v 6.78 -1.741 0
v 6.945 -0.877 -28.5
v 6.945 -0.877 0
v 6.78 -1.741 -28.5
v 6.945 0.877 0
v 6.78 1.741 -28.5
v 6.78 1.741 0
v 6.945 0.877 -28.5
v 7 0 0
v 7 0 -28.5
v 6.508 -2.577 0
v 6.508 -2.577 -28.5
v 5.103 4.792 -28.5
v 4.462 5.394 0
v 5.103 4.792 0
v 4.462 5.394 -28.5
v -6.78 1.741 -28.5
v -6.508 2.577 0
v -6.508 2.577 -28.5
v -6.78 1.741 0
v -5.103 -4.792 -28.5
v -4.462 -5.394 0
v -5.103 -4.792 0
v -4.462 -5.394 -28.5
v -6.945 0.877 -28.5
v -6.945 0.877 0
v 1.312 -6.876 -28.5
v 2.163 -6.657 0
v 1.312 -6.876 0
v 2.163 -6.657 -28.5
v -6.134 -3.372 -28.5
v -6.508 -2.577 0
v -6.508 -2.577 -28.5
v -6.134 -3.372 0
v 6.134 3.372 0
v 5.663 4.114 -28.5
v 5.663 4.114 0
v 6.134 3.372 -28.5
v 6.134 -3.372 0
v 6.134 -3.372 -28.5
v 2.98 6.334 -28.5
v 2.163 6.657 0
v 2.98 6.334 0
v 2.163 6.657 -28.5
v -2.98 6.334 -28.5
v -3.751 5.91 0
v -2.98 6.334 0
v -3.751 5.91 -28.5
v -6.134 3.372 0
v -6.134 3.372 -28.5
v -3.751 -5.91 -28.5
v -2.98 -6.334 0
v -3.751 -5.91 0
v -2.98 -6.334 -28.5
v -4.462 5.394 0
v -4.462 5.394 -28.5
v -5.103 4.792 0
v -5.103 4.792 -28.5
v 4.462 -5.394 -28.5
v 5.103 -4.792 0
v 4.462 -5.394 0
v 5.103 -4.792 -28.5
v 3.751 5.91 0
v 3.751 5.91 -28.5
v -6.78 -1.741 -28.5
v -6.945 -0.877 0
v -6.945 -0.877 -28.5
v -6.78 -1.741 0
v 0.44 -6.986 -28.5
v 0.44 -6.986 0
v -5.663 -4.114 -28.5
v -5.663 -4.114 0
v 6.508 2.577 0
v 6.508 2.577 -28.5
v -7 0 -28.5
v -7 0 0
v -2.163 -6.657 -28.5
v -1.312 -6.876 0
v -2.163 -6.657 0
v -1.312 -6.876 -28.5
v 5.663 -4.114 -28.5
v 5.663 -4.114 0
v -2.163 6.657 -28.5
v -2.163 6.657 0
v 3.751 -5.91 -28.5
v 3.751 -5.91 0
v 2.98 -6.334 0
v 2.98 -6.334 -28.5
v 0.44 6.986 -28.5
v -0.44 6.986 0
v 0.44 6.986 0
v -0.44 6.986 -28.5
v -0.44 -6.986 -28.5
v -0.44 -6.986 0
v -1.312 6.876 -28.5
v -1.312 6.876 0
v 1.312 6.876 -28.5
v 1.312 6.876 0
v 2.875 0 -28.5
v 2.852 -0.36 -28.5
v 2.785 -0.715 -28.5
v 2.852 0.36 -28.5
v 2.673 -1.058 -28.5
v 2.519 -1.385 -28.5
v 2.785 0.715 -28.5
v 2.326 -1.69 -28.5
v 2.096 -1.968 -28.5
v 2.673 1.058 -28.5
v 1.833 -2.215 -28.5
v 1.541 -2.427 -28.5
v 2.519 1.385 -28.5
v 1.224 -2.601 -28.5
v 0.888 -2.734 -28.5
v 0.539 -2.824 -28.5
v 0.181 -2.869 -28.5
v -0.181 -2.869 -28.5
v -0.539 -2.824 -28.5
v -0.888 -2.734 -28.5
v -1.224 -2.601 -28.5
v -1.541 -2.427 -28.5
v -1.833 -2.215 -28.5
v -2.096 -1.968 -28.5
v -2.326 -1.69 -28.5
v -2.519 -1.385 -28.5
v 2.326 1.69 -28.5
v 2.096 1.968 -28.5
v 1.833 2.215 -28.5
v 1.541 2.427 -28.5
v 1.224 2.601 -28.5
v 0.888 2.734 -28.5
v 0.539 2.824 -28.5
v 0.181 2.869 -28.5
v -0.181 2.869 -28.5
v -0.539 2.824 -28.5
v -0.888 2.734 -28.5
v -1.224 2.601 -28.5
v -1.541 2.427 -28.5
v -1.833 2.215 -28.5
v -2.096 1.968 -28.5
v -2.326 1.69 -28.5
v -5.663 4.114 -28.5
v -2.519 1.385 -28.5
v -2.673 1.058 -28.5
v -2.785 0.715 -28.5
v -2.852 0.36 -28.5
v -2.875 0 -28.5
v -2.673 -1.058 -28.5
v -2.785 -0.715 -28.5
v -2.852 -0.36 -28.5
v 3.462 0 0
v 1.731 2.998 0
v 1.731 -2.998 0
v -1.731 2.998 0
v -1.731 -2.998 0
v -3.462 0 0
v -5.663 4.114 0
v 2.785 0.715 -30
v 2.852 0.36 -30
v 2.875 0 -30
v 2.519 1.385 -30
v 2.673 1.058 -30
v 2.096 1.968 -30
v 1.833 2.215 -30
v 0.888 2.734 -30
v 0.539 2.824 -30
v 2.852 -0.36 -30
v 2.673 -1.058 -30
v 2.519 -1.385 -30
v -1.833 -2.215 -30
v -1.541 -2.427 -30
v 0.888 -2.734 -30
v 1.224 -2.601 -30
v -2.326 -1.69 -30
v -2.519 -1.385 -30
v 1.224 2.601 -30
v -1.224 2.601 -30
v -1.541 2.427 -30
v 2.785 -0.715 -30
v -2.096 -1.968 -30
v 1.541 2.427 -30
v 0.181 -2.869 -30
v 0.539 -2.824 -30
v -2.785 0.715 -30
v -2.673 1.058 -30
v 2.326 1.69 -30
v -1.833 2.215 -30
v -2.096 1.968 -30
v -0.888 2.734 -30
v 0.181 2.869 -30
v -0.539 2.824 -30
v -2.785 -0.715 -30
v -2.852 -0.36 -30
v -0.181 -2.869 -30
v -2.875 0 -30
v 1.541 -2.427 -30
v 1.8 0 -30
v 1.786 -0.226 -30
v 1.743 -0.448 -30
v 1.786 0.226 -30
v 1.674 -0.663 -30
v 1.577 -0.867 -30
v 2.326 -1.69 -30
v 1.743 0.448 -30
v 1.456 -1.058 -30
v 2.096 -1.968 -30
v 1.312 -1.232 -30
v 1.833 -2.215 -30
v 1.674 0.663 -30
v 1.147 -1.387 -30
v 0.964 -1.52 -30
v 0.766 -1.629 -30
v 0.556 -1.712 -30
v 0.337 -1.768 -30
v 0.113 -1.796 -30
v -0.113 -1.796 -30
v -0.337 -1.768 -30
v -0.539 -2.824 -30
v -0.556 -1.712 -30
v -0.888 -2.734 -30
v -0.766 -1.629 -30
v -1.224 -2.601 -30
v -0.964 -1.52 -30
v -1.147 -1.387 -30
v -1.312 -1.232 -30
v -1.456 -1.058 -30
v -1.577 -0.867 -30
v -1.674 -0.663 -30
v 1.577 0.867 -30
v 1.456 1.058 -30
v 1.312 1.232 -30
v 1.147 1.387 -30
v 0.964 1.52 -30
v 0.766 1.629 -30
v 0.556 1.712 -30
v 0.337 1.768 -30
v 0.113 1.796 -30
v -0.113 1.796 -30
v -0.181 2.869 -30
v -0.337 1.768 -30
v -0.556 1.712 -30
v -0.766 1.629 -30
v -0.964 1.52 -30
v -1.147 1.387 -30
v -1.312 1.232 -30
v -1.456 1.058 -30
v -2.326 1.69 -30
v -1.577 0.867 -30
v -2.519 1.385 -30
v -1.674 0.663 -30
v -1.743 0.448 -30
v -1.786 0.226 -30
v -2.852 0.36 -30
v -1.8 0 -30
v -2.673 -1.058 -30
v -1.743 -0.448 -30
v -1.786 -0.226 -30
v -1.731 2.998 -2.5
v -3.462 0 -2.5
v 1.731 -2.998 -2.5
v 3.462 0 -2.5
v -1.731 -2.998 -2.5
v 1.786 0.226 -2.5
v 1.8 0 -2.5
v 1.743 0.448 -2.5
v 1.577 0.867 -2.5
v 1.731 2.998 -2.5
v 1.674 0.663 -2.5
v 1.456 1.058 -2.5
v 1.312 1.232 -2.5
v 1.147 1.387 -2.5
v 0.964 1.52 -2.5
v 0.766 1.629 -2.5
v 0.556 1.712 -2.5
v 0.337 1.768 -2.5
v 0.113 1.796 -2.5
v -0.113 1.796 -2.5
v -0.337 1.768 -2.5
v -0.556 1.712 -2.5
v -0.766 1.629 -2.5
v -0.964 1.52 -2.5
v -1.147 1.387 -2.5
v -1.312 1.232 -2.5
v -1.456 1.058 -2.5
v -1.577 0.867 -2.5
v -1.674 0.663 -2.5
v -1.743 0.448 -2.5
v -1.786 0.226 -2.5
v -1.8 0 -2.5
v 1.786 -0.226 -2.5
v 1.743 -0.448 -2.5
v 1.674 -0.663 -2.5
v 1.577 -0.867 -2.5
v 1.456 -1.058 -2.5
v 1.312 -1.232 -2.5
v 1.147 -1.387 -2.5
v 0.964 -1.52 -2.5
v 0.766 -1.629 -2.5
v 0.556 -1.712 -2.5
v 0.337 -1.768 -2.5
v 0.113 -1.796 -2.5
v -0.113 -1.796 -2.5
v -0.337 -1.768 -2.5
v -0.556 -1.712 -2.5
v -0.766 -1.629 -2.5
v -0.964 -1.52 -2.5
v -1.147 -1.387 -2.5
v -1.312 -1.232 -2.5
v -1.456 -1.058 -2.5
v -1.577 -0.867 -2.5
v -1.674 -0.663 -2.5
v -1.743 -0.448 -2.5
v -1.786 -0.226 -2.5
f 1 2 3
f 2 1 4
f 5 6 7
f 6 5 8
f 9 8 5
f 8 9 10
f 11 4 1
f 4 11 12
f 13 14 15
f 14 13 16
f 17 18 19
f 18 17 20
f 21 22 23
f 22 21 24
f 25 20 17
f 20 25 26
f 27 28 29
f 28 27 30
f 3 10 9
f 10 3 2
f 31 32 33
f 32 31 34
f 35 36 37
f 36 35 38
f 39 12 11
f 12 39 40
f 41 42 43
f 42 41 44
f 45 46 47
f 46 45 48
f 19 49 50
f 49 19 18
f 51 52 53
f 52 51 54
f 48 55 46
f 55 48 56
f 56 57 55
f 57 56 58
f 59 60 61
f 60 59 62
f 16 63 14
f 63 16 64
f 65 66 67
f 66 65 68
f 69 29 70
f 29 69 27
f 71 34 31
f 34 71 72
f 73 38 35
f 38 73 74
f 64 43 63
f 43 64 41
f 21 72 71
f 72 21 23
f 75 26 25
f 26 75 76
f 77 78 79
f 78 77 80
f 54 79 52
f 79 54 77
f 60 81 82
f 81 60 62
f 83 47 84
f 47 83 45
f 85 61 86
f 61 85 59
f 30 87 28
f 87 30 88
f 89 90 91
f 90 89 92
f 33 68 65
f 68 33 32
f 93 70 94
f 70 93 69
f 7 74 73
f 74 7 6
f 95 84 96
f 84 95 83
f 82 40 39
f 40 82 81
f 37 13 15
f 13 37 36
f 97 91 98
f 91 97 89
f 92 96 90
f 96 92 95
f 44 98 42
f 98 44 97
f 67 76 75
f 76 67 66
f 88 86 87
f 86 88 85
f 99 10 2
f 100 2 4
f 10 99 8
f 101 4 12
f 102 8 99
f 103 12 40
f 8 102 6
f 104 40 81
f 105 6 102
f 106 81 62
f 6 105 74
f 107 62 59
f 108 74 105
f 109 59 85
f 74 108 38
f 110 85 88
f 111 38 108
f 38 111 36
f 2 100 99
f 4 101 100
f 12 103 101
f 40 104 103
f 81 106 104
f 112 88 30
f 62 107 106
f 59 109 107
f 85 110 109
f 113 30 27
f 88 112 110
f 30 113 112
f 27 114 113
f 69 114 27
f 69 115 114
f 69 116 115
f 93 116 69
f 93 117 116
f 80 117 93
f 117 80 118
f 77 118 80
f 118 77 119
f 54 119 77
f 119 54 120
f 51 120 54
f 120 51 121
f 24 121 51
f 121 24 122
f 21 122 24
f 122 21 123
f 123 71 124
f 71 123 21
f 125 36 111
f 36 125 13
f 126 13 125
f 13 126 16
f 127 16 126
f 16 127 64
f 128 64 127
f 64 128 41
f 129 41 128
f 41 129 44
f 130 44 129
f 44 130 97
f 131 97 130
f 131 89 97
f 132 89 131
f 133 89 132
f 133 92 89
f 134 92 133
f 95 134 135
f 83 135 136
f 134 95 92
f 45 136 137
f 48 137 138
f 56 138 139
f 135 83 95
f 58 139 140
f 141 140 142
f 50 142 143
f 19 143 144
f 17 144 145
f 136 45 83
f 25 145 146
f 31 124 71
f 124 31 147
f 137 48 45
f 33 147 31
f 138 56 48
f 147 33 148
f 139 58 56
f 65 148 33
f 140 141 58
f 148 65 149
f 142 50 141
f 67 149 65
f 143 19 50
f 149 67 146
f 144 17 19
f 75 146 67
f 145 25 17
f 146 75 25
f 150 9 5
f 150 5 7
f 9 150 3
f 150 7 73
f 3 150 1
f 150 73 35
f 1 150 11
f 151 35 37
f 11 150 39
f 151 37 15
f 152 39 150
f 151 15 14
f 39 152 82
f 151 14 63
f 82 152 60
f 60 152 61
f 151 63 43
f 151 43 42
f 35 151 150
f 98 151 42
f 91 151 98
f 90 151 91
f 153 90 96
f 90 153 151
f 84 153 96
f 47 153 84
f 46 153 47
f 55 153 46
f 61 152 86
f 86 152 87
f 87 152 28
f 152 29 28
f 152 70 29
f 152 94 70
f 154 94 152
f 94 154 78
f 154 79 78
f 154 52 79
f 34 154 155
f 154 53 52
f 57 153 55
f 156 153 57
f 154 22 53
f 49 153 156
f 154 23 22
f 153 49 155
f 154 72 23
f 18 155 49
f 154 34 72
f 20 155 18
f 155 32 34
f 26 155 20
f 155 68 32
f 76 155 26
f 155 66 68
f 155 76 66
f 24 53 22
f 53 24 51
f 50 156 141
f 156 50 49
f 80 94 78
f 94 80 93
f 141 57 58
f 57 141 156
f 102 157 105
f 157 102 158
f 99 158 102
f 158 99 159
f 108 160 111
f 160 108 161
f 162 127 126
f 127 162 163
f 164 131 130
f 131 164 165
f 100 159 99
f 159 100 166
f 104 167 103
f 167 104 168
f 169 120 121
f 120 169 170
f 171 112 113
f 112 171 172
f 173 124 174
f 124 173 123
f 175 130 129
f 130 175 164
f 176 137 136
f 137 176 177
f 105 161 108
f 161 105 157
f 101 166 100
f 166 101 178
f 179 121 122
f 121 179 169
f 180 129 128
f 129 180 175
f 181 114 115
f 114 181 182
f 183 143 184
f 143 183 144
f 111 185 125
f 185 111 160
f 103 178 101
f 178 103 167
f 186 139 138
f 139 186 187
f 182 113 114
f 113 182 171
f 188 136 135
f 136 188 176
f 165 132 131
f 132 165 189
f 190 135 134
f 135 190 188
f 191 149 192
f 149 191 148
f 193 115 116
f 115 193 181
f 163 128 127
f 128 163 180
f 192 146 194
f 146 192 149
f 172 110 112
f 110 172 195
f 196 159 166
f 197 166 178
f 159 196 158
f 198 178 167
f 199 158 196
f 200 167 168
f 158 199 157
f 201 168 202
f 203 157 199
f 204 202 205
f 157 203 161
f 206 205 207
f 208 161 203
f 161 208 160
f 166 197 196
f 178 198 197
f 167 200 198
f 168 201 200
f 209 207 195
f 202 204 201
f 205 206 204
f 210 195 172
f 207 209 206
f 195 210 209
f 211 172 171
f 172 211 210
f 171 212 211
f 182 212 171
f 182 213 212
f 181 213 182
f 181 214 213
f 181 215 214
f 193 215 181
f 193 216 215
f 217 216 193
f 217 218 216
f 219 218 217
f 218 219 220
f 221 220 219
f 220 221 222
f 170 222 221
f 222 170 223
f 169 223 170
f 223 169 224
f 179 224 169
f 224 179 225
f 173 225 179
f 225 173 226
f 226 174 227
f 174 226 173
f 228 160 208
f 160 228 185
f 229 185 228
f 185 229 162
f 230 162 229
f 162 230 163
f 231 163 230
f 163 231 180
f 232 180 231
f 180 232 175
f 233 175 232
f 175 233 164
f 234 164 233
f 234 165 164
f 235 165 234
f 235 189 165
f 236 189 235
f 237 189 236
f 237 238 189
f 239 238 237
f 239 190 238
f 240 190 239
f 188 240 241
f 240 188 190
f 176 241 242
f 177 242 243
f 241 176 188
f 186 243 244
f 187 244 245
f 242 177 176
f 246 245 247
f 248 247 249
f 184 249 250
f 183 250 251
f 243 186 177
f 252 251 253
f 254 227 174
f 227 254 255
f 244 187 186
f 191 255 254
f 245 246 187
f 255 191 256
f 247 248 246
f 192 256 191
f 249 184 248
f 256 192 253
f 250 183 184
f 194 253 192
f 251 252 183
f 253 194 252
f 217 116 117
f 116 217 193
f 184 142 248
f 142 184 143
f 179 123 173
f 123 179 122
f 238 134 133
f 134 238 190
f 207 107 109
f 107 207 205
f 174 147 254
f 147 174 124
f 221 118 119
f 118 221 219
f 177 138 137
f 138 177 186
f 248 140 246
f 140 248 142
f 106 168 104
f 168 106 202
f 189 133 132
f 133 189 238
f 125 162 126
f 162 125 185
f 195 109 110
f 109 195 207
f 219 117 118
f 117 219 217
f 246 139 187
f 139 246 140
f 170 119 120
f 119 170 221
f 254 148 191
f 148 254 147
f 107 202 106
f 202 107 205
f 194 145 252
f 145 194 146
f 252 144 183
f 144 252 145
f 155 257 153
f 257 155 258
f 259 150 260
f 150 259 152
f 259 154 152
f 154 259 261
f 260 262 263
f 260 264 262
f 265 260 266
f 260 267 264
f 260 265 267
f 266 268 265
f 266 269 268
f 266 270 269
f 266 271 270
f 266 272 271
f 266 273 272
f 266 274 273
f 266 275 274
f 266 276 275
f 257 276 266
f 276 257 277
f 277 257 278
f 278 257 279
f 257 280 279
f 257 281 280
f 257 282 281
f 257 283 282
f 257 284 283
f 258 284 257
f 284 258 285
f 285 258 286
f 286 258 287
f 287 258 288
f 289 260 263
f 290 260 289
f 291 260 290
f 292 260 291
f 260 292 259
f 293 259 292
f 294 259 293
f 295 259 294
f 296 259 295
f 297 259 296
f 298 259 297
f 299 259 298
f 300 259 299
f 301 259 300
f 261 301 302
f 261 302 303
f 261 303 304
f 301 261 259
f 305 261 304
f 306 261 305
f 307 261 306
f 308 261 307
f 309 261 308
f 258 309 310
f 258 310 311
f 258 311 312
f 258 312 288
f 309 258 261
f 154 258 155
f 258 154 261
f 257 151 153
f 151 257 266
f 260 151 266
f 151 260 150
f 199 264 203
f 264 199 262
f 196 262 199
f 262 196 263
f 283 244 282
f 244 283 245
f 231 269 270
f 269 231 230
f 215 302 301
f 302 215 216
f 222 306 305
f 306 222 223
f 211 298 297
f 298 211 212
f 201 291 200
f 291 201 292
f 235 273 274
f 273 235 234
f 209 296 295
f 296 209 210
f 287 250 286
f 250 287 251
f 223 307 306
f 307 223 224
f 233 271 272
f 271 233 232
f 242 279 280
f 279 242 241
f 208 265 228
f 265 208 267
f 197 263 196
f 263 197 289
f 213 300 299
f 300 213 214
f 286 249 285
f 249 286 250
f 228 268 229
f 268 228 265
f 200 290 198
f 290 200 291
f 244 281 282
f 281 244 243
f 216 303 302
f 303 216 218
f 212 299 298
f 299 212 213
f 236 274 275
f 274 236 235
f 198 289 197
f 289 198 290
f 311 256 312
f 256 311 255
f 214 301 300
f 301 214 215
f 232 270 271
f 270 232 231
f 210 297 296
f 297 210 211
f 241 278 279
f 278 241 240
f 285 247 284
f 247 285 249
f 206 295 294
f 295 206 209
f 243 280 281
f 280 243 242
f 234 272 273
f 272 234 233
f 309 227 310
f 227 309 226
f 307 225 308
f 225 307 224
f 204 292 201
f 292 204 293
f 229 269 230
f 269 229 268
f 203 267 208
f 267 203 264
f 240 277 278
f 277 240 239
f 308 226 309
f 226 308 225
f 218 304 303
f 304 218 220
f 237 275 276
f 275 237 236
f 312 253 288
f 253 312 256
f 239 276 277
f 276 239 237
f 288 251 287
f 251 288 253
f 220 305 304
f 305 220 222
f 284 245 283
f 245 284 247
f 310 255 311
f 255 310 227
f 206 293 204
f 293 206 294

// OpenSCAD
$fn = 50;

difference() {
	union() {
		translate(v = [0, 0, -28.5]) {
			cylinder(h = 28.5, r = 7.0);
		}
		#translate(v = [0, 0, -30.0]) {
			cylinder(h = 30, r = 2.875);
		}
	}
	union() {
		translate(v = [0, 0, 0]) {
			rotate(a = [0, 0, 0]) {
				difference() {
					union() {
						translate(v = [0, 0, -2.5]) {
							linear_extrude(height = 2.5) {
								polygon(points = [[3.4619999999999997, 0.0], [1.7310000000000003, 2.9981799479017264], [-1.7309999999999992, 2.9981799479017264], [-3.4619999999999997, 4.2397272186481365e-16], [-1.7310000000000014, -2.998179947901726], [1.7309999999999977, -2.9981799479017277]]);
							}
						}
					}
					union();
				}
			}
		}
		#translate(v = [0, 0, -100.0]) {
			cylinder(h = 200, r = 1.8);
		}
	}
}
